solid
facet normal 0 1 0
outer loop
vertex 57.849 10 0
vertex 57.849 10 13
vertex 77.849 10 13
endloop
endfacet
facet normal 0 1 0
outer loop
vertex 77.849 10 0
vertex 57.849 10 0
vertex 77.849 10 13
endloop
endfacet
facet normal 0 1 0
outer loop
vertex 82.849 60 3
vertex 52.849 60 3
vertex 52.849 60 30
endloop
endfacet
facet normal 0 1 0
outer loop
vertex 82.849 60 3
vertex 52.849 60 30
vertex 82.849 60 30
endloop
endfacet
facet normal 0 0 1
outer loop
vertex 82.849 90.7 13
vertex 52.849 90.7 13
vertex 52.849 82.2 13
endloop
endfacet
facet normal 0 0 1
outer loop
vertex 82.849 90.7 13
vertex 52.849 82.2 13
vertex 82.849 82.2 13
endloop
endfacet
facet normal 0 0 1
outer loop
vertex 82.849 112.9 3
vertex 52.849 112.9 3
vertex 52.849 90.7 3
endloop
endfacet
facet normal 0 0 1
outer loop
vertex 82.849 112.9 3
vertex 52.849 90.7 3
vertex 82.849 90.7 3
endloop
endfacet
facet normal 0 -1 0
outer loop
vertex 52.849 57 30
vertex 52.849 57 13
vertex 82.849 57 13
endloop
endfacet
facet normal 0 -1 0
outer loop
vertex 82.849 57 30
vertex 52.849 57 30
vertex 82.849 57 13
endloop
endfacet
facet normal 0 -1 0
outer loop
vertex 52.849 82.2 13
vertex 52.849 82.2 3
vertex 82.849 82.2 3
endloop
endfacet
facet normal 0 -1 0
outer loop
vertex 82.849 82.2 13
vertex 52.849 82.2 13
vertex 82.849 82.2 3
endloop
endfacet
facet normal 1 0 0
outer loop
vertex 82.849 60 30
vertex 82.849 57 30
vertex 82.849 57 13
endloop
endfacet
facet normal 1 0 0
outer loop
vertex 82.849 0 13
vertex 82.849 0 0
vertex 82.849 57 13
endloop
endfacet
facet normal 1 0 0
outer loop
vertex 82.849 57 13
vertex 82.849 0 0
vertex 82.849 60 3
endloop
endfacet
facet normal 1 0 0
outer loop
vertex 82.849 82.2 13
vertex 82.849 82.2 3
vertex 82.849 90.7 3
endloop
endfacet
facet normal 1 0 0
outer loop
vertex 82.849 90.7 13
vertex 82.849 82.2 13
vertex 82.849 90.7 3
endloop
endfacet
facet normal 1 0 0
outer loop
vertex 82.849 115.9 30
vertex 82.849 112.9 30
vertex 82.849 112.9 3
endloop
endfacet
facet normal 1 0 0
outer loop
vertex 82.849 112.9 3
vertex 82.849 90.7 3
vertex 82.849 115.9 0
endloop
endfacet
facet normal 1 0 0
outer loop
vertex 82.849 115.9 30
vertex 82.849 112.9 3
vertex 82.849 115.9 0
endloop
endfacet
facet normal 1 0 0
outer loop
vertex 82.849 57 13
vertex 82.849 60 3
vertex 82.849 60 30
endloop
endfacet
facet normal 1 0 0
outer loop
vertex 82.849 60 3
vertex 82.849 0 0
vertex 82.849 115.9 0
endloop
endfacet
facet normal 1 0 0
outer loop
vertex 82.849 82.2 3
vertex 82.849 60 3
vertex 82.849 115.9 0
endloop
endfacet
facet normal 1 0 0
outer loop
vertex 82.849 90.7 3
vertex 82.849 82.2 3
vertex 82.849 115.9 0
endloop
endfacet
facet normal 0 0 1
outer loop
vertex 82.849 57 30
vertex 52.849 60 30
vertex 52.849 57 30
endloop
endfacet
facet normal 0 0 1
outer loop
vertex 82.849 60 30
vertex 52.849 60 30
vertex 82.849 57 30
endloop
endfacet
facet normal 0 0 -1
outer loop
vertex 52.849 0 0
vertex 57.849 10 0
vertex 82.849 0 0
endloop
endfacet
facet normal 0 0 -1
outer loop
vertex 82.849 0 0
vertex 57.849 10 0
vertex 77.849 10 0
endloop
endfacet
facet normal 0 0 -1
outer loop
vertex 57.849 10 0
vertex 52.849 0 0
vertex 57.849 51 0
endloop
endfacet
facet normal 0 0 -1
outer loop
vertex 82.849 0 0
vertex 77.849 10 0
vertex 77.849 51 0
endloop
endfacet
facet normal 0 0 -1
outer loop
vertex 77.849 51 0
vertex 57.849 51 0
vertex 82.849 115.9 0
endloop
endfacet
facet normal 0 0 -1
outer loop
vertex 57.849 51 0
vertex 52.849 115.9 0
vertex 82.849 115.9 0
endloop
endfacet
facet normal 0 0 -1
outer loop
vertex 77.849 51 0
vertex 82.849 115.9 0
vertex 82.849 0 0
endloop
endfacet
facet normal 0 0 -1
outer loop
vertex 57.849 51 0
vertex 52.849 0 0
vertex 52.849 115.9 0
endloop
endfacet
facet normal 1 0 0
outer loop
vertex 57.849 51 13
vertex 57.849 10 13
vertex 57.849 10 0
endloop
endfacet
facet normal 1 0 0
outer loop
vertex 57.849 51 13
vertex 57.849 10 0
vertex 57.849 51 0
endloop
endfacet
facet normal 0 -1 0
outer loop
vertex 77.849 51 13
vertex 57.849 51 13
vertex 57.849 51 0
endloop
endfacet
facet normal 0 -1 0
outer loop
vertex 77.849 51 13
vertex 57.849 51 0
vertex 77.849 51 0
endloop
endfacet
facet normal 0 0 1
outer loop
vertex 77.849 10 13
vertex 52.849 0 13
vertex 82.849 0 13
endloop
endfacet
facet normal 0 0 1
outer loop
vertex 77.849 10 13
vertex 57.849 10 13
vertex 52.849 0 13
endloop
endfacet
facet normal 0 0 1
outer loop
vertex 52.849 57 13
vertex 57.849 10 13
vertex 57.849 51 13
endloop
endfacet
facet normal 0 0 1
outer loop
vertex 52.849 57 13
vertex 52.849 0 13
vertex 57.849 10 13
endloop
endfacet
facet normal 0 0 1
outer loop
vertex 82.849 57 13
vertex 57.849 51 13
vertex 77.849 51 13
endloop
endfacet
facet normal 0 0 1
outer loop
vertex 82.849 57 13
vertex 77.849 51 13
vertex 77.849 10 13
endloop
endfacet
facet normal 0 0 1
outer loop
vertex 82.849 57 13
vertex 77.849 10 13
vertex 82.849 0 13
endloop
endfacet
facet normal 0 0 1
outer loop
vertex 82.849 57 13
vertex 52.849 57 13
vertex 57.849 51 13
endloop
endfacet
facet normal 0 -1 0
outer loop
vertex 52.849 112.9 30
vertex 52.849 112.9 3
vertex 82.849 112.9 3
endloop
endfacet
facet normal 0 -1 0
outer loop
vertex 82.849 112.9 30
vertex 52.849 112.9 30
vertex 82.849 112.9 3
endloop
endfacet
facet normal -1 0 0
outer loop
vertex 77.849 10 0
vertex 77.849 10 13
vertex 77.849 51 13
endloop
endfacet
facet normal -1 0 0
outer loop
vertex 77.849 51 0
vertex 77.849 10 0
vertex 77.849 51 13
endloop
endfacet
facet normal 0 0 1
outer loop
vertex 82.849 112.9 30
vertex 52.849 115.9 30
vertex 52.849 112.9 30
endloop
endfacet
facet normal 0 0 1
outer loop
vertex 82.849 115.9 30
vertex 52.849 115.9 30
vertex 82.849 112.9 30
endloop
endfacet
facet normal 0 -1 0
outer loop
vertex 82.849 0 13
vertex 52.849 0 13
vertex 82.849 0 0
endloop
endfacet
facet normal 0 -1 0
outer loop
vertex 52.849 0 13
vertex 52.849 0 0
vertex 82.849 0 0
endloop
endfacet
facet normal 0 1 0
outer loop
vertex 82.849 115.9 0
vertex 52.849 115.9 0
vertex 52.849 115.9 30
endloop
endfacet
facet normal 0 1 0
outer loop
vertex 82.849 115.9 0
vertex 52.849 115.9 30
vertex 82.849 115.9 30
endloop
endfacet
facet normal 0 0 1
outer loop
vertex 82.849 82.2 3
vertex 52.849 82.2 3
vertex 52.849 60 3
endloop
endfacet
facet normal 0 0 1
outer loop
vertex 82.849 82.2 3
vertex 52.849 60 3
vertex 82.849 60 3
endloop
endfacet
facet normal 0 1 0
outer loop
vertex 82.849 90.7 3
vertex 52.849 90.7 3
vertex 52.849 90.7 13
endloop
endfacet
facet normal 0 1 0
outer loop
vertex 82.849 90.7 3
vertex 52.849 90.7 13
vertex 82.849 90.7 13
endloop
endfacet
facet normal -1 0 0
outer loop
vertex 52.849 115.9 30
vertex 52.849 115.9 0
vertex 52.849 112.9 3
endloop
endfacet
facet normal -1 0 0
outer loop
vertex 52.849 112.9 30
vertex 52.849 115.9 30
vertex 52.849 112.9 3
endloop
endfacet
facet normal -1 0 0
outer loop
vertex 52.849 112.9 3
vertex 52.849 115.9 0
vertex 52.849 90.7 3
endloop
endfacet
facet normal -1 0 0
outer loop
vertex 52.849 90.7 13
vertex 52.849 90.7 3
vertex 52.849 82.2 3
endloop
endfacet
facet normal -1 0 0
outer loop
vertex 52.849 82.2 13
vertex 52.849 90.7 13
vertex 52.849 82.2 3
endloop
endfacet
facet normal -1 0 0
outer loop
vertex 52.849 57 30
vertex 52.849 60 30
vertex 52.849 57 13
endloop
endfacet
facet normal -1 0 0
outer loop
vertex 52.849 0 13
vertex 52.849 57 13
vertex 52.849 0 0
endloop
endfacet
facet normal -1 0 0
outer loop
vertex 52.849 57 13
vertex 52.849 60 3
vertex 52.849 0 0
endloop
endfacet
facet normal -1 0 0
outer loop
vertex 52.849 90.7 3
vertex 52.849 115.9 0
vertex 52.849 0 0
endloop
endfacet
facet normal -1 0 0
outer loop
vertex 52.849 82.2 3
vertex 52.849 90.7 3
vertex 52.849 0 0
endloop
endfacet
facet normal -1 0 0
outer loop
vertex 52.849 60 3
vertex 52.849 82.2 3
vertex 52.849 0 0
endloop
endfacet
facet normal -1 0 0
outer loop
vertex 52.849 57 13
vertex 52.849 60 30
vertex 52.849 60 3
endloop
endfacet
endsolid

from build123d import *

# Parameters (mm, degrees)
F0_W     = 30
F0_H     = 57
F0_H_2   = 3
F0_H_3   = 22.2
F0_H_4   = 8.5
F1_DEPTH = 3
F2_DEPTH = 30
F3_DEPTH = 13
F4_DEPTH = 10
F5_W     = 20
F5_H     = 41
F6_DEPTH = 13


# Not quite as in the source:
# - a feature of the source that left no trace in its solid (it failed there, or was rolled back) is left out


with BuildPart() as f1:
    # F0 (on Top) → F1 (new body)
    with BuildSketch(Plane.XY):
        with Locations((67.8492219866, 28.5)):
            Rectangle(F0_W, F0_H)
        with Locations((67.8492219866, 58.5)):
            Rectangle(F0_W, F0_H_2)
        with Locations((67.8492219866, 71.1)):
            Rectangle(F0_W, F0_H_3)
        with Locations((67.8492219866, 86.45)):
            Rectangle(F0_W, F0_H_4)
        with Locations((67.8492219866, 101.8)):
            Rectangle(F0_W, F0_H_3)
        with Locations((67.8492219866, 114.4)):
            Rectangle(F0_W, F0_H_2)
    extrude(amount=F1_DEPTH)

    # F0 (on Top) → F2 (join)
    with BuildSketch(Plane.XY):
        with Locations((67.8492219866, 58.5)):
            Rectangle(F0_W, F0_H_2)
        with Locations((67.8492219866, 114.4)):
            Rectangle(F0_W, F0_H_2)
    extrude(amount=F2_DEPTH)

    # F0 (on Top) → F3 (join)
    with BuildSketch(Plane.XY):
        with Locations((67.8492219866, 86.45)):
            Rectangle(F0_W, F0_H_4)
    extrude(amount=F3_DEPTH)

    # F4 (add): a face of the model
    f4_faces = [f1.faces().sort_by_distance(p)[0] for p in [
        (67.8492219866, 28.5, 3),
    ]]
    extrude(f4_faces, amount=F4_DEPTH)

    # F5 (on face) → F6 (cut, through all)
    with BuildSketch(Plane.XY.offset(13)):
        with Locations((67.8492219866, 30.5)):
            Rectangle(F5_W, F5_H)
    extrude(amount=-F6_DEPTH, mode=Mode.SUBTRACT)


solid = f1.part
